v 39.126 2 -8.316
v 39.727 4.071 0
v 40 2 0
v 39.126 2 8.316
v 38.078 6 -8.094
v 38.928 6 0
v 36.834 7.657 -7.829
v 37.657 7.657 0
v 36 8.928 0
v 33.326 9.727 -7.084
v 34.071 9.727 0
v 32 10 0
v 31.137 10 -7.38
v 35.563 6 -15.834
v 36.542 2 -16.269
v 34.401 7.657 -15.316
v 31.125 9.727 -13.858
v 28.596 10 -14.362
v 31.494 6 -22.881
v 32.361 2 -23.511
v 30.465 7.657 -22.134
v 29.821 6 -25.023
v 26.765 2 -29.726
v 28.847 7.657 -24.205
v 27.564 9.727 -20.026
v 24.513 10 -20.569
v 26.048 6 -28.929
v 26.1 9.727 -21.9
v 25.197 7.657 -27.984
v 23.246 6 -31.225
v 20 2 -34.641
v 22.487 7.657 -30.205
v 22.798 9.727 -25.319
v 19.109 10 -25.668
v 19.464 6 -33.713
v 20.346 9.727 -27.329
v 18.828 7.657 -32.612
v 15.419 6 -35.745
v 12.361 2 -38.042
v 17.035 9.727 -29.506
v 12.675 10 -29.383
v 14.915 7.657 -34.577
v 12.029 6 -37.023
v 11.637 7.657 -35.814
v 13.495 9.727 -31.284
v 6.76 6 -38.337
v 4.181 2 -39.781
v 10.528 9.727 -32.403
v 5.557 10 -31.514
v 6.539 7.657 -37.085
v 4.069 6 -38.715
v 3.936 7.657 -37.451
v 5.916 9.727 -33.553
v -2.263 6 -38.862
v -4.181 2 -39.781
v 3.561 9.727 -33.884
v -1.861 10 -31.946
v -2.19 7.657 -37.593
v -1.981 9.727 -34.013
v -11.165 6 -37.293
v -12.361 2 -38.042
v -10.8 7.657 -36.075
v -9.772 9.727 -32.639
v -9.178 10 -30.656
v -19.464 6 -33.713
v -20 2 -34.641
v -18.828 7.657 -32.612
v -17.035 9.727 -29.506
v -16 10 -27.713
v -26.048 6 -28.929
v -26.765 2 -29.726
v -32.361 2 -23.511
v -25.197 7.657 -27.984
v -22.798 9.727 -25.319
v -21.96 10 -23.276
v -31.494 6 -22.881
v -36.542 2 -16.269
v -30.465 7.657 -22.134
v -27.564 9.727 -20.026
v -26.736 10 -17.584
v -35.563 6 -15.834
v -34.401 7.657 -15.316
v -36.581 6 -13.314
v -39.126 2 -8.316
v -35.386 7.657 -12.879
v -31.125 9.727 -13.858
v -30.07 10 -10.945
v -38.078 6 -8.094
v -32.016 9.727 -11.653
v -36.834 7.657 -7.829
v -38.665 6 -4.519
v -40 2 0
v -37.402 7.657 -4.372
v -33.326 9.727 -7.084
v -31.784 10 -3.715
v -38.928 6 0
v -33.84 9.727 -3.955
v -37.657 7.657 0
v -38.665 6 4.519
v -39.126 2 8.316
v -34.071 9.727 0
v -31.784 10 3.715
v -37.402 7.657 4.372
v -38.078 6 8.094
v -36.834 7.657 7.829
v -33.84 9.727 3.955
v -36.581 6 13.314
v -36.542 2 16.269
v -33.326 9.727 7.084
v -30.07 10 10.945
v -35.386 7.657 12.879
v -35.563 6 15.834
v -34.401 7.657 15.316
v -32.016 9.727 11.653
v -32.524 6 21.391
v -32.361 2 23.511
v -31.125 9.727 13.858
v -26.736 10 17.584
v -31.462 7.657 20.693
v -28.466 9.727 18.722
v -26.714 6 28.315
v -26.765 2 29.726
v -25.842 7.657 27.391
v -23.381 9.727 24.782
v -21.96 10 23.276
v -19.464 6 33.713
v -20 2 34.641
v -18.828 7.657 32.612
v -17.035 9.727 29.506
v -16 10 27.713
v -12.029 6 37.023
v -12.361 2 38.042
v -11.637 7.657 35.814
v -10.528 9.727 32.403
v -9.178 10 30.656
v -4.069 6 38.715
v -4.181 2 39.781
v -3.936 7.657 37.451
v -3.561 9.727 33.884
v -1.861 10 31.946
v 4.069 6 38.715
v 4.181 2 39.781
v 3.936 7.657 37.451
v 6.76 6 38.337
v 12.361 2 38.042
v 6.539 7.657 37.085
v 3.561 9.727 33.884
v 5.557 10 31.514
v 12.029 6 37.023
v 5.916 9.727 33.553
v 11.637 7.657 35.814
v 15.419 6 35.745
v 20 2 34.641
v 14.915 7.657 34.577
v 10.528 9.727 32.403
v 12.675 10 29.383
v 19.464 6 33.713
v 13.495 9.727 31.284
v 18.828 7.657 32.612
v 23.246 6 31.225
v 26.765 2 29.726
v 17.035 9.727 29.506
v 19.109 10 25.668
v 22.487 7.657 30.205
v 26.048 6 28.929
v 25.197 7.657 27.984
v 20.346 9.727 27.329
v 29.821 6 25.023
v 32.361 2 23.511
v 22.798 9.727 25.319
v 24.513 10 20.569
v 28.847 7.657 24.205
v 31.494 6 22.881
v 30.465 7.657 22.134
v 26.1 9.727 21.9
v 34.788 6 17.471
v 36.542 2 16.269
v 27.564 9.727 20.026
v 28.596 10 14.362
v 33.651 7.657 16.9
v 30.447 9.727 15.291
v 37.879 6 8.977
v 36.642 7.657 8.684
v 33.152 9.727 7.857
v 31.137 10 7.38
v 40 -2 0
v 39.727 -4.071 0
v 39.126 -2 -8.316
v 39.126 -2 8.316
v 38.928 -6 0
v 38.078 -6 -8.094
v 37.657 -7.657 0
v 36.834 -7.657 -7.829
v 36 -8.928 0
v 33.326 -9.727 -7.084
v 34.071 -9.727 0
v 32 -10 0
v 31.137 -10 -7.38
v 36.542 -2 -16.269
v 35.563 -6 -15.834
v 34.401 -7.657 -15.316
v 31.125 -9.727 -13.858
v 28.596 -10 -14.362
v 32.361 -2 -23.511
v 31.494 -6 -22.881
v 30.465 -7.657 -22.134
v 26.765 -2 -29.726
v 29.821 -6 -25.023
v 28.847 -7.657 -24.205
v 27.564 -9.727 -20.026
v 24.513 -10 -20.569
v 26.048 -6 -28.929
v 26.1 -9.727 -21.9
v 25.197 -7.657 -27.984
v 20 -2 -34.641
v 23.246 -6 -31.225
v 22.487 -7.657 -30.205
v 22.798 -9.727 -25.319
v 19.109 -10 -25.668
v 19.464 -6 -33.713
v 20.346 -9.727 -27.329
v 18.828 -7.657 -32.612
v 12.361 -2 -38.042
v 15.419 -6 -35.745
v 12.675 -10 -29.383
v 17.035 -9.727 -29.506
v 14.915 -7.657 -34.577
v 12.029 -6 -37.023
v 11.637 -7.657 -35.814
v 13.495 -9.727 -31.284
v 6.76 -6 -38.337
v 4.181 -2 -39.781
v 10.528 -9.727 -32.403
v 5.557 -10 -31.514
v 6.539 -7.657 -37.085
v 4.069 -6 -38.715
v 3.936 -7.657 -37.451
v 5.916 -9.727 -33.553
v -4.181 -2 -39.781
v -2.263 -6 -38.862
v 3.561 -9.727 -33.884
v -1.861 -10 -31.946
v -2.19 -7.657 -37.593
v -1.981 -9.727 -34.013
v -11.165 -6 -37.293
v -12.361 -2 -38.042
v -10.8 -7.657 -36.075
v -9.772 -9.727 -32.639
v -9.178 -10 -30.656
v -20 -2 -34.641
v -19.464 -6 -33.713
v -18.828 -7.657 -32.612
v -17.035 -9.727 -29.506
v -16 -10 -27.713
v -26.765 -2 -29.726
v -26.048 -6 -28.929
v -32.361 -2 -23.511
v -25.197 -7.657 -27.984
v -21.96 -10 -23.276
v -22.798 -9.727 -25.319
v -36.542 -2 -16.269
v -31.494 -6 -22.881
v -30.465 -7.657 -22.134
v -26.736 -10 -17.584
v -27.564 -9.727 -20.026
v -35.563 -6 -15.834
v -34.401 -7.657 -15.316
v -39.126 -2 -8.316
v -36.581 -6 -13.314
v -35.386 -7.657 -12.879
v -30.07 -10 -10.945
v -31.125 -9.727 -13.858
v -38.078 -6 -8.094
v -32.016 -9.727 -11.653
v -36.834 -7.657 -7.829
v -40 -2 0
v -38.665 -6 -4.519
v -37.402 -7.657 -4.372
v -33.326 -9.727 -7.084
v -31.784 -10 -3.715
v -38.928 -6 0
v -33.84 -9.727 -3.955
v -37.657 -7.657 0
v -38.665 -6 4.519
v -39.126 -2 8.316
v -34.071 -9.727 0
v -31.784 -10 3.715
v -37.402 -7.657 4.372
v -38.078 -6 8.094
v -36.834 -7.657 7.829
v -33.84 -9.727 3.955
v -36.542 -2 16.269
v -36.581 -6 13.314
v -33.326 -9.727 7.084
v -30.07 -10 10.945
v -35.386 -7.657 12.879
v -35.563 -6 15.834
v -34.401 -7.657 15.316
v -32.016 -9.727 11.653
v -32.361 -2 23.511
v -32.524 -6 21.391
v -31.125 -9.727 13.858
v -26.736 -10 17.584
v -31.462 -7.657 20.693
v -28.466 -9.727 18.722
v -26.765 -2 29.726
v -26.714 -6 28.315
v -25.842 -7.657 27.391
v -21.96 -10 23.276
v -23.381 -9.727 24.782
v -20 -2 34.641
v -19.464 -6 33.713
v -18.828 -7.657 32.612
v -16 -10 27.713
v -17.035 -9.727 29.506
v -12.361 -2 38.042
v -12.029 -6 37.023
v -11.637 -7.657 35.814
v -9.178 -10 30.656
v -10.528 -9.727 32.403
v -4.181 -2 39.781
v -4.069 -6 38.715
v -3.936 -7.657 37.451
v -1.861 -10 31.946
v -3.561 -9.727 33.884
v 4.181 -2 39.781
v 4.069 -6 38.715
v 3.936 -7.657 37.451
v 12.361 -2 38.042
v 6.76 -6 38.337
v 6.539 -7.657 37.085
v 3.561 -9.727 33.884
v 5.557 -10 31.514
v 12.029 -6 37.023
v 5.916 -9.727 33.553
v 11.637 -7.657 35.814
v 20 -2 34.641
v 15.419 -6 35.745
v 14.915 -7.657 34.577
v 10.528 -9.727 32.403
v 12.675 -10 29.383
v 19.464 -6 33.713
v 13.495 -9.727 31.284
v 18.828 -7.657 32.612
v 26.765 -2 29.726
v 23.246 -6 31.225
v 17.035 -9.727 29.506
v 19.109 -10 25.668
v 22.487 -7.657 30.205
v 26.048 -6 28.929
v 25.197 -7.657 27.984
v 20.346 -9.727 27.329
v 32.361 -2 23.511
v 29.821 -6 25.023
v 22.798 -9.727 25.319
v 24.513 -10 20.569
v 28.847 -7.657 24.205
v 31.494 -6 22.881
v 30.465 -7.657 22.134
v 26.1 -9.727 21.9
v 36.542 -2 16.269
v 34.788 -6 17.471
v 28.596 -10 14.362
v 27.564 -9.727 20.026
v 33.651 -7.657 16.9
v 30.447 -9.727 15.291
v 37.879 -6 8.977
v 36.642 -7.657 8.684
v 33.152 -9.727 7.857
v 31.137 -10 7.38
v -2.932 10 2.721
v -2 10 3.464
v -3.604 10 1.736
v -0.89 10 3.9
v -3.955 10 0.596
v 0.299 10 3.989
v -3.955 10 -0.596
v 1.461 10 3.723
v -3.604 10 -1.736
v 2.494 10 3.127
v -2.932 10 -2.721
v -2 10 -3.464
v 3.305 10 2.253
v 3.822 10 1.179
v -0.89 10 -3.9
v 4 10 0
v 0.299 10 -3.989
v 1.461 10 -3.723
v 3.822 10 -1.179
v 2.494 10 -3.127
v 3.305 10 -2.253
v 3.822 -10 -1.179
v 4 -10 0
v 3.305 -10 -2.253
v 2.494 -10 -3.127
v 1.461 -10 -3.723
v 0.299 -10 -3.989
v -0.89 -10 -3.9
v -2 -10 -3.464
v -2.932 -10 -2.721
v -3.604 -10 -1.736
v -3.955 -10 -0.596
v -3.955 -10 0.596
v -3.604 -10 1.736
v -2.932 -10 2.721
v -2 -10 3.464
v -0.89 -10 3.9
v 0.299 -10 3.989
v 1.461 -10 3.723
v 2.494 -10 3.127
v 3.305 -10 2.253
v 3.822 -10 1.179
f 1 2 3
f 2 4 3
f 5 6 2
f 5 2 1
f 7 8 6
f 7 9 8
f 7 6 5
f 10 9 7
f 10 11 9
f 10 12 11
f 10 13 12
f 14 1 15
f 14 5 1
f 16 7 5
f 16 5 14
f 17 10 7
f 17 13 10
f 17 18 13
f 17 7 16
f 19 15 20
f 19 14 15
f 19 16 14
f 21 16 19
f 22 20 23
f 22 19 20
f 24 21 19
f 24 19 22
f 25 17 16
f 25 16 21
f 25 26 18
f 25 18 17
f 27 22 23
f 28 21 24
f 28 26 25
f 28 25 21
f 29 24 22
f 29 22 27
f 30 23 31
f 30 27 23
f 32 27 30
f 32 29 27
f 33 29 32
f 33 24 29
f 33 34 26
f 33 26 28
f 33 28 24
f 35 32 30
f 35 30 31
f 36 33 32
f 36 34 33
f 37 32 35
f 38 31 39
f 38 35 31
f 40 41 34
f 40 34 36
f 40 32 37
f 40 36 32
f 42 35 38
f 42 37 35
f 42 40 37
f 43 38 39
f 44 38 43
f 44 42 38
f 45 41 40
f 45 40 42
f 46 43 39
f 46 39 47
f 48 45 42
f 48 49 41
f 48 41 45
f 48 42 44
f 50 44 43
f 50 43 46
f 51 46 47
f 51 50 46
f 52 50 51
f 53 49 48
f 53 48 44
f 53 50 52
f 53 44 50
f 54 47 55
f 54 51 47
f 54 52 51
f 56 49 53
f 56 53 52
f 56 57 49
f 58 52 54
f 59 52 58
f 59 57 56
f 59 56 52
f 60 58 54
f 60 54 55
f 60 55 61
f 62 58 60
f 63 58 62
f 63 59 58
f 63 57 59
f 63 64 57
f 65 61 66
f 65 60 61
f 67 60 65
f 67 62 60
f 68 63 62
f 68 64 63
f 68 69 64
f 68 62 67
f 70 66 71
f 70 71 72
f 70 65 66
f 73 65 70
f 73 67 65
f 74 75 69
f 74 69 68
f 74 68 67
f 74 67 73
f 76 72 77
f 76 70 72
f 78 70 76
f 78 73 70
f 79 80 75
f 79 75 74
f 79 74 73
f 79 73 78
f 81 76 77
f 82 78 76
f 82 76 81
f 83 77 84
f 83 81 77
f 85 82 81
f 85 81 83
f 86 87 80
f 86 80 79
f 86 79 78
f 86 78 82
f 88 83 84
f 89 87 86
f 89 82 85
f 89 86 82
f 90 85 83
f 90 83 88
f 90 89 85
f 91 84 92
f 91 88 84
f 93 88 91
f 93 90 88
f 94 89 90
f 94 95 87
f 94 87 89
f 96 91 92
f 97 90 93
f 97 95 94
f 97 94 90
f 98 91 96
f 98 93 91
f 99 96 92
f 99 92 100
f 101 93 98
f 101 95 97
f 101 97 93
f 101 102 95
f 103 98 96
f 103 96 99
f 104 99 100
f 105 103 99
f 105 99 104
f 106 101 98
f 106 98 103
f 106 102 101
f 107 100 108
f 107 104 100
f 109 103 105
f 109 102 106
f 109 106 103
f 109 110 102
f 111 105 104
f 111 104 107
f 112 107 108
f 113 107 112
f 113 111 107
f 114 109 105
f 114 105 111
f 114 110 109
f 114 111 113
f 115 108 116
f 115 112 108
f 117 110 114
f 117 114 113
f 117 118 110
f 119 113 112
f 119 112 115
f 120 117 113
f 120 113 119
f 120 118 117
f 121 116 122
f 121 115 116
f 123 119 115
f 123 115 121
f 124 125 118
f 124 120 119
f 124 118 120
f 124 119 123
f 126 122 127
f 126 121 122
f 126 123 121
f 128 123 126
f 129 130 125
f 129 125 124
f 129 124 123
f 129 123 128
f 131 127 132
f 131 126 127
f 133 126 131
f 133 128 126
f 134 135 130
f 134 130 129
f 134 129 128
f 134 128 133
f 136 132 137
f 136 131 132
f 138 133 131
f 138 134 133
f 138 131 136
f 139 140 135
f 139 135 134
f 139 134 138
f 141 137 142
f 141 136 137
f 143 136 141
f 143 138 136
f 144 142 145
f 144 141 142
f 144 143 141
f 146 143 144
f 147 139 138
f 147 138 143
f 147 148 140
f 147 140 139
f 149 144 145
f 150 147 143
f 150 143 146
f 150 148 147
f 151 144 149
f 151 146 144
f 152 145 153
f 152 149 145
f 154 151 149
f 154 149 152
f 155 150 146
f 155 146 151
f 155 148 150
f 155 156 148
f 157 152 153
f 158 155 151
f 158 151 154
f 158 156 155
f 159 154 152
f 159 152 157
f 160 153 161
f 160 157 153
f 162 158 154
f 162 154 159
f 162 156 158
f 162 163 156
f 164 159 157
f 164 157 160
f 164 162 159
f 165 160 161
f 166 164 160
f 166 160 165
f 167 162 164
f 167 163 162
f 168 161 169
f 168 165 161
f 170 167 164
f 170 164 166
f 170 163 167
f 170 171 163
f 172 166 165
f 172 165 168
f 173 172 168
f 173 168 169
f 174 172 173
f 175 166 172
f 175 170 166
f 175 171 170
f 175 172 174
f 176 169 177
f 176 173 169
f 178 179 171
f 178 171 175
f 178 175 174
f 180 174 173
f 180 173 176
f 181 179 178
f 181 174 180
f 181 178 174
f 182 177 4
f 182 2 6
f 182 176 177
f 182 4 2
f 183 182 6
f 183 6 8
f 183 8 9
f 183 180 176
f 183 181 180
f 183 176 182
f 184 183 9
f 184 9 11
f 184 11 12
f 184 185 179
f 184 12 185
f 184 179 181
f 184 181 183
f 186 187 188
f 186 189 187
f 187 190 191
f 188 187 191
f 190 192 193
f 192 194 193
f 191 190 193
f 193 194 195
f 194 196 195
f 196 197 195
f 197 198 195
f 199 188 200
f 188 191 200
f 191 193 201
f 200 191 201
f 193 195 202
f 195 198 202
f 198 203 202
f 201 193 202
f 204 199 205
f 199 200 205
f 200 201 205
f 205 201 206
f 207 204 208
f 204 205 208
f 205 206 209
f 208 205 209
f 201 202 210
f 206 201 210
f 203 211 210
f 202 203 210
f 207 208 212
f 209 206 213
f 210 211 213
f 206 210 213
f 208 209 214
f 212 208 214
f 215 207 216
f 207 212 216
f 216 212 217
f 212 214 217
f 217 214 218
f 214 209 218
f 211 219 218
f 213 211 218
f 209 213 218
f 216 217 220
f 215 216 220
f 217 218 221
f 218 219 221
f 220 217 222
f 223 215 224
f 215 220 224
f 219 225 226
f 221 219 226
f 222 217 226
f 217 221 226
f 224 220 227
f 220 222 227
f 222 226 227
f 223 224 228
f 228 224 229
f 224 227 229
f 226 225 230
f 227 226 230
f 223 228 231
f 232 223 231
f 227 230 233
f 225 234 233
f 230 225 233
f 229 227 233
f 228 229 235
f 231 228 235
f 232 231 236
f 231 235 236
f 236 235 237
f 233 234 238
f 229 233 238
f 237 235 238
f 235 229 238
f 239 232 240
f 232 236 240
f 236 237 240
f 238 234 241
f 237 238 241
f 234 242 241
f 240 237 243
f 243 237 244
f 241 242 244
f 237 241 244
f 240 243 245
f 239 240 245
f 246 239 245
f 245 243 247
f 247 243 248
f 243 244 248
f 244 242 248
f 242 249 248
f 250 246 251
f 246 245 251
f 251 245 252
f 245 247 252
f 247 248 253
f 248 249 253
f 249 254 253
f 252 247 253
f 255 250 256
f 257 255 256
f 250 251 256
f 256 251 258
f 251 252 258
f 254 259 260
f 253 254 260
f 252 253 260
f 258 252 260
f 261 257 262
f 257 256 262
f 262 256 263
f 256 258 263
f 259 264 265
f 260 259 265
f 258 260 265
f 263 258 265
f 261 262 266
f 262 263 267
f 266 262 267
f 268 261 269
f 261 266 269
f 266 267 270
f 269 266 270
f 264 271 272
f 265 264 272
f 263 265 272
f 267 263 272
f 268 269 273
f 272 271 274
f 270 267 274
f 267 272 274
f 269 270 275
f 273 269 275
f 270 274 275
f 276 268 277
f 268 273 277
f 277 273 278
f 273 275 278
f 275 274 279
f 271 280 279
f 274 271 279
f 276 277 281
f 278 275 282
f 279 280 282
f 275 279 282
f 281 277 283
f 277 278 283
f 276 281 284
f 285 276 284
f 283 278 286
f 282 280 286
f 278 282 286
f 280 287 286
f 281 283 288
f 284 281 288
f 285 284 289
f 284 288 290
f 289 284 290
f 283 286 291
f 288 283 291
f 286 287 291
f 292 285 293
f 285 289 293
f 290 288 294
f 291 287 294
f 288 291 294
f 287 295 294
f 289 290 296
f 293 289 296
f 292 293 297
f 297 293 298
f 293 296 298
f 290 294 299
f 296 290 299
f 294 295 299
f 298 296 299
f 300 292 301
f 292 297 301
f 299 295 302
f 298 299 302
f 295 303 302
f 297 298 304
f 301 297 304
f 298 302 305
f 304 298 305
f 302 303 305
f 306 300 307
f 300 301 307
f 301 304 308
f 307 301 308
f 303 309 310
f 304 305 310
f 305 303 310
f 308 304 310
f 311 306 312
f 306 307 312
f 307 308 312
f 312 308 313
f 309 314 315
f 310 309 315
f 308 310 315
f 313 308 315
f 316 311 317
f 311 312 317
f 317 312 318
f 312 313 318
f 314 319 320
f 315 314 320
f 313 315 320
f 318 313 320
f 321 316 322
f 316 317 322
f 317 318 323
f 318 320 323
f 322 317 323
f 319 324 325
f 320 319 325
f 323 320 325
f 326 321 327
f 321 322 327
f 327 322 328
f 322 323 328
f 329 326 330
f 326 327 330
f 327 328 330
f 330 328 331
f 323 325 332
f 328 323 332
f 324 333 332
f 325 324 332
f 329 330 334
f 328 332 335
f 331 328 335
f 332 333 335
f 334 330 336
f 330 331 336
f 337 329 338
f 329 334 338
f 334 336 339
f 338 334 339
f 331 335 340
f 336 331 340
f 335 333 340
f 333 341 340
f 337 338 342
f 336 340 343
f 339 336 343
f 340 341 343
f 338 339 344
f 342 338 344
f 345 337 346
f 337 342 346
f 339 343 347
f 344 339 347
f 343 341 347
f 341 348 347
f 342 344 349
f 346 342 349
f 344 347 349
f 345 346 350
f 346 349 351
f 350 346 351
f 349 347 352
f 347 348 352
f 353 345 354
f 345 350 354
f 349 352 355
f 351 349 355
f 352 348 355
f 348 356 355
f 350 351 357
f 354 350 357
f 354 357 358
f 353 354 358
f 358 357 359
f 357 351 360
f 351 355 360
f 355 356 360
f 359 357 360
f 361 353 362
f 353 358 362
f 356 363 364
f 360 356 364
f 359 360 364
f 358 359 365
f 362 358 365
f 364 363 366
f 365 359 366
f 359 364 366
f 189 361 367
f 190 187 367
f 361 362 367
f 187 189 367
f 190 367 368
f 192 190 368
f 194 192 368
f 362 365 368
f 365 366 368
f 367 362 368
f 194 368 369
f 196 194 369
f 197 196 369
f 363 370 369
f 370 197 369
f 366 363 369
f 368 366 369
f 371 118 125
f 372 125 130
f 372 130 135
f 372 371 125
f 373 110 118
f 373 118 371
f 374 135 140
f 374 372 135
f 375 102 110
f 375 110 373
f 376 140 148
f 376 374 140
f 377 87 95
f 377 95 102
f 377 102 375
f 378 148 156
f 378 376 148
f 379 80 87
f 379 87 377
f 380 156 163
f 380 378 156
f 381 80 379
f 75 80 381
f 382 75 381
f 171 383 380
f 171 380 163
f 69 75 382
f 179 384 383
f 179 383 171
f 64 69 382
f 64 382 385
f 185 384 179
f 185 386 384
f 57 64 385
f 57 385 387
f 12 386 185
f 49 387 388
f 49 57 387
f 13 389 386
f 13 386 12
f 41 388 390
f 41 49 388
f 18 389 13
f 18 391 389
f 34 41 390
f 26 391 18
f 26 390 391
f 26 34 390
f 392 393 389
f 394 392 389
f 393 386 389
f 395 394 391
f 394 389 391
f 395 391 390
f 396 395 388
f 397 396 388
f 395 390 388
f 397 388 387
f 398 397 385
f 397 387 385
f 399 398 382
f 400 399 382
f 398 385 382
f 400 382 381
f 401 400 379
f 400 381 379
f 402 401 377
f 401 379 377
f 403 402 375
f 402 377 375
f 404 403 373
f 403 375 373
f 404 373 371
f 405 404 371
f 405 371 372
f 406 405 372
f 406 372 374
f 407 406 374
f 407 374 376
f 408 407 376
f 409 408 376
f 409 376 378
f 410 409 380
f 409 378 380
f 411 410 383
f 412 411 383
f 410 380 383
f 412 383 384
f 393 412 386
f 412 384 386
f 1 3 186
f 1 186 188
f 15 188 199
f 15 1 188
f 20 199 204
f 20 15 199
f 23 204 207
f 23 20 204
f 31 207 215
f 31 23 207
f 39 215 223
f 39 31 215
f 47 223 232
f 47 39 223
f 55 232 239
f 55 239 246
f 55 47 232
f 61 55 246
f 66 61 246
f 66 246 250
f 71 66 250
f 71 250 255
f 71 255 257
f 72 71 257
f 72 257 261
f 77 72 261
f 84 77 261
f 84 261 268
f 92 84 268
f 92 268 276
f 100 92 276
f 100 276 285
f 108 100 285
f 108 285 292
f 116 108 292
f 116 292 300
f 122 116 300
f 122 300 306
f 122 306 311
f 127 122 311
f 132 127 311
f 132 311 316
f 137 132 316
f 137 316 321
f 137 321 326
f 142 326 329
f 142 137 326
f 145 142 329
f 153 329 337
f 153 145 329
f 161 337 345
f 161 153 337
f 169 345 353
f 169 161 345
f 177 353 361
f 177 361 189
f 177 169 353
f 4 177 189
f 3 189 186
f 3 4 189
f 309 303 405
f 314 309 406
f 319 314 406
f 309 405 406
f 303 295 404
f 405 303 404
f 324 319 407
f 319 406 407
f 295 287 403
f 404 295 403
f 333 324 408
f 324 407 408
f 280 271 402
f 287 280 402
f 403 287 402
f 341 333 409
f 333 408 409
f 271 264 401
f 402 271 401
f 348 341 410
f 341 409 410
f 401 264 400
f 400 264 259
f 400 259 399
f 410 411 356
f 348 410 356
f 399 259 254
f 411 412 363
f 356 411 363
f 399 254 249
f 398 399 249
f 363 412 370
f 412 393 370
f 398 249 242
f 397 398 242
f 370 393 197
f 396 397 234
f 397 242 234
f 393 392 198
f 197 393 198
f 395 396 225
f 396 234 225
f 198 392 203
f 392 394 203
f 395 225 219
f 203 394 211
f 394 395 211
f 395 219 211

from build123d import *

# Parameters (mm, degrees)
SKETCH_1_R          = 40
EXTRUDE_1_DEPTH     = 10
FILLET_1_R          = 8
SKETCH_2_R          = 4
CUT_EXTRUDE_1_DEPTH = 10


with BuildPart() as part:
    # 草图1 → 凸台-拉伸1 (new body, symmetric)
    with BuildSketch(Plane(origin=(0, 0, 0), x_dir=(1, 0, 0), z_dir=(0, 1, 0))):
        Circle(SKETCH_1_R)
    extrude(amount=EXTRUDE_1_DEPTH, both=True)

    # 圆角1
    fillet_1_edges = [part.edges().sort_by_distance(p)[0] for p in [
        (-40, -10, 0),
        (-40, 10, 0),
    ]]
    fillet(fillet_1_edges, radius=FILLET_1_R)

    # 草图2 → 切除-拉伸1 (cut, symmetric)
    with BuildSketch(Plane(origin=(0, 0, 0), x_dir=(1, 0, 0), z_dir=(0, 1, 0))):
        Circle(SKETCH_2_R)
    extrude(amount=CUT_EXTRUDE_1_DEPTH, both=True, mode=Mode.SUBTRACT)


solid = part.part
